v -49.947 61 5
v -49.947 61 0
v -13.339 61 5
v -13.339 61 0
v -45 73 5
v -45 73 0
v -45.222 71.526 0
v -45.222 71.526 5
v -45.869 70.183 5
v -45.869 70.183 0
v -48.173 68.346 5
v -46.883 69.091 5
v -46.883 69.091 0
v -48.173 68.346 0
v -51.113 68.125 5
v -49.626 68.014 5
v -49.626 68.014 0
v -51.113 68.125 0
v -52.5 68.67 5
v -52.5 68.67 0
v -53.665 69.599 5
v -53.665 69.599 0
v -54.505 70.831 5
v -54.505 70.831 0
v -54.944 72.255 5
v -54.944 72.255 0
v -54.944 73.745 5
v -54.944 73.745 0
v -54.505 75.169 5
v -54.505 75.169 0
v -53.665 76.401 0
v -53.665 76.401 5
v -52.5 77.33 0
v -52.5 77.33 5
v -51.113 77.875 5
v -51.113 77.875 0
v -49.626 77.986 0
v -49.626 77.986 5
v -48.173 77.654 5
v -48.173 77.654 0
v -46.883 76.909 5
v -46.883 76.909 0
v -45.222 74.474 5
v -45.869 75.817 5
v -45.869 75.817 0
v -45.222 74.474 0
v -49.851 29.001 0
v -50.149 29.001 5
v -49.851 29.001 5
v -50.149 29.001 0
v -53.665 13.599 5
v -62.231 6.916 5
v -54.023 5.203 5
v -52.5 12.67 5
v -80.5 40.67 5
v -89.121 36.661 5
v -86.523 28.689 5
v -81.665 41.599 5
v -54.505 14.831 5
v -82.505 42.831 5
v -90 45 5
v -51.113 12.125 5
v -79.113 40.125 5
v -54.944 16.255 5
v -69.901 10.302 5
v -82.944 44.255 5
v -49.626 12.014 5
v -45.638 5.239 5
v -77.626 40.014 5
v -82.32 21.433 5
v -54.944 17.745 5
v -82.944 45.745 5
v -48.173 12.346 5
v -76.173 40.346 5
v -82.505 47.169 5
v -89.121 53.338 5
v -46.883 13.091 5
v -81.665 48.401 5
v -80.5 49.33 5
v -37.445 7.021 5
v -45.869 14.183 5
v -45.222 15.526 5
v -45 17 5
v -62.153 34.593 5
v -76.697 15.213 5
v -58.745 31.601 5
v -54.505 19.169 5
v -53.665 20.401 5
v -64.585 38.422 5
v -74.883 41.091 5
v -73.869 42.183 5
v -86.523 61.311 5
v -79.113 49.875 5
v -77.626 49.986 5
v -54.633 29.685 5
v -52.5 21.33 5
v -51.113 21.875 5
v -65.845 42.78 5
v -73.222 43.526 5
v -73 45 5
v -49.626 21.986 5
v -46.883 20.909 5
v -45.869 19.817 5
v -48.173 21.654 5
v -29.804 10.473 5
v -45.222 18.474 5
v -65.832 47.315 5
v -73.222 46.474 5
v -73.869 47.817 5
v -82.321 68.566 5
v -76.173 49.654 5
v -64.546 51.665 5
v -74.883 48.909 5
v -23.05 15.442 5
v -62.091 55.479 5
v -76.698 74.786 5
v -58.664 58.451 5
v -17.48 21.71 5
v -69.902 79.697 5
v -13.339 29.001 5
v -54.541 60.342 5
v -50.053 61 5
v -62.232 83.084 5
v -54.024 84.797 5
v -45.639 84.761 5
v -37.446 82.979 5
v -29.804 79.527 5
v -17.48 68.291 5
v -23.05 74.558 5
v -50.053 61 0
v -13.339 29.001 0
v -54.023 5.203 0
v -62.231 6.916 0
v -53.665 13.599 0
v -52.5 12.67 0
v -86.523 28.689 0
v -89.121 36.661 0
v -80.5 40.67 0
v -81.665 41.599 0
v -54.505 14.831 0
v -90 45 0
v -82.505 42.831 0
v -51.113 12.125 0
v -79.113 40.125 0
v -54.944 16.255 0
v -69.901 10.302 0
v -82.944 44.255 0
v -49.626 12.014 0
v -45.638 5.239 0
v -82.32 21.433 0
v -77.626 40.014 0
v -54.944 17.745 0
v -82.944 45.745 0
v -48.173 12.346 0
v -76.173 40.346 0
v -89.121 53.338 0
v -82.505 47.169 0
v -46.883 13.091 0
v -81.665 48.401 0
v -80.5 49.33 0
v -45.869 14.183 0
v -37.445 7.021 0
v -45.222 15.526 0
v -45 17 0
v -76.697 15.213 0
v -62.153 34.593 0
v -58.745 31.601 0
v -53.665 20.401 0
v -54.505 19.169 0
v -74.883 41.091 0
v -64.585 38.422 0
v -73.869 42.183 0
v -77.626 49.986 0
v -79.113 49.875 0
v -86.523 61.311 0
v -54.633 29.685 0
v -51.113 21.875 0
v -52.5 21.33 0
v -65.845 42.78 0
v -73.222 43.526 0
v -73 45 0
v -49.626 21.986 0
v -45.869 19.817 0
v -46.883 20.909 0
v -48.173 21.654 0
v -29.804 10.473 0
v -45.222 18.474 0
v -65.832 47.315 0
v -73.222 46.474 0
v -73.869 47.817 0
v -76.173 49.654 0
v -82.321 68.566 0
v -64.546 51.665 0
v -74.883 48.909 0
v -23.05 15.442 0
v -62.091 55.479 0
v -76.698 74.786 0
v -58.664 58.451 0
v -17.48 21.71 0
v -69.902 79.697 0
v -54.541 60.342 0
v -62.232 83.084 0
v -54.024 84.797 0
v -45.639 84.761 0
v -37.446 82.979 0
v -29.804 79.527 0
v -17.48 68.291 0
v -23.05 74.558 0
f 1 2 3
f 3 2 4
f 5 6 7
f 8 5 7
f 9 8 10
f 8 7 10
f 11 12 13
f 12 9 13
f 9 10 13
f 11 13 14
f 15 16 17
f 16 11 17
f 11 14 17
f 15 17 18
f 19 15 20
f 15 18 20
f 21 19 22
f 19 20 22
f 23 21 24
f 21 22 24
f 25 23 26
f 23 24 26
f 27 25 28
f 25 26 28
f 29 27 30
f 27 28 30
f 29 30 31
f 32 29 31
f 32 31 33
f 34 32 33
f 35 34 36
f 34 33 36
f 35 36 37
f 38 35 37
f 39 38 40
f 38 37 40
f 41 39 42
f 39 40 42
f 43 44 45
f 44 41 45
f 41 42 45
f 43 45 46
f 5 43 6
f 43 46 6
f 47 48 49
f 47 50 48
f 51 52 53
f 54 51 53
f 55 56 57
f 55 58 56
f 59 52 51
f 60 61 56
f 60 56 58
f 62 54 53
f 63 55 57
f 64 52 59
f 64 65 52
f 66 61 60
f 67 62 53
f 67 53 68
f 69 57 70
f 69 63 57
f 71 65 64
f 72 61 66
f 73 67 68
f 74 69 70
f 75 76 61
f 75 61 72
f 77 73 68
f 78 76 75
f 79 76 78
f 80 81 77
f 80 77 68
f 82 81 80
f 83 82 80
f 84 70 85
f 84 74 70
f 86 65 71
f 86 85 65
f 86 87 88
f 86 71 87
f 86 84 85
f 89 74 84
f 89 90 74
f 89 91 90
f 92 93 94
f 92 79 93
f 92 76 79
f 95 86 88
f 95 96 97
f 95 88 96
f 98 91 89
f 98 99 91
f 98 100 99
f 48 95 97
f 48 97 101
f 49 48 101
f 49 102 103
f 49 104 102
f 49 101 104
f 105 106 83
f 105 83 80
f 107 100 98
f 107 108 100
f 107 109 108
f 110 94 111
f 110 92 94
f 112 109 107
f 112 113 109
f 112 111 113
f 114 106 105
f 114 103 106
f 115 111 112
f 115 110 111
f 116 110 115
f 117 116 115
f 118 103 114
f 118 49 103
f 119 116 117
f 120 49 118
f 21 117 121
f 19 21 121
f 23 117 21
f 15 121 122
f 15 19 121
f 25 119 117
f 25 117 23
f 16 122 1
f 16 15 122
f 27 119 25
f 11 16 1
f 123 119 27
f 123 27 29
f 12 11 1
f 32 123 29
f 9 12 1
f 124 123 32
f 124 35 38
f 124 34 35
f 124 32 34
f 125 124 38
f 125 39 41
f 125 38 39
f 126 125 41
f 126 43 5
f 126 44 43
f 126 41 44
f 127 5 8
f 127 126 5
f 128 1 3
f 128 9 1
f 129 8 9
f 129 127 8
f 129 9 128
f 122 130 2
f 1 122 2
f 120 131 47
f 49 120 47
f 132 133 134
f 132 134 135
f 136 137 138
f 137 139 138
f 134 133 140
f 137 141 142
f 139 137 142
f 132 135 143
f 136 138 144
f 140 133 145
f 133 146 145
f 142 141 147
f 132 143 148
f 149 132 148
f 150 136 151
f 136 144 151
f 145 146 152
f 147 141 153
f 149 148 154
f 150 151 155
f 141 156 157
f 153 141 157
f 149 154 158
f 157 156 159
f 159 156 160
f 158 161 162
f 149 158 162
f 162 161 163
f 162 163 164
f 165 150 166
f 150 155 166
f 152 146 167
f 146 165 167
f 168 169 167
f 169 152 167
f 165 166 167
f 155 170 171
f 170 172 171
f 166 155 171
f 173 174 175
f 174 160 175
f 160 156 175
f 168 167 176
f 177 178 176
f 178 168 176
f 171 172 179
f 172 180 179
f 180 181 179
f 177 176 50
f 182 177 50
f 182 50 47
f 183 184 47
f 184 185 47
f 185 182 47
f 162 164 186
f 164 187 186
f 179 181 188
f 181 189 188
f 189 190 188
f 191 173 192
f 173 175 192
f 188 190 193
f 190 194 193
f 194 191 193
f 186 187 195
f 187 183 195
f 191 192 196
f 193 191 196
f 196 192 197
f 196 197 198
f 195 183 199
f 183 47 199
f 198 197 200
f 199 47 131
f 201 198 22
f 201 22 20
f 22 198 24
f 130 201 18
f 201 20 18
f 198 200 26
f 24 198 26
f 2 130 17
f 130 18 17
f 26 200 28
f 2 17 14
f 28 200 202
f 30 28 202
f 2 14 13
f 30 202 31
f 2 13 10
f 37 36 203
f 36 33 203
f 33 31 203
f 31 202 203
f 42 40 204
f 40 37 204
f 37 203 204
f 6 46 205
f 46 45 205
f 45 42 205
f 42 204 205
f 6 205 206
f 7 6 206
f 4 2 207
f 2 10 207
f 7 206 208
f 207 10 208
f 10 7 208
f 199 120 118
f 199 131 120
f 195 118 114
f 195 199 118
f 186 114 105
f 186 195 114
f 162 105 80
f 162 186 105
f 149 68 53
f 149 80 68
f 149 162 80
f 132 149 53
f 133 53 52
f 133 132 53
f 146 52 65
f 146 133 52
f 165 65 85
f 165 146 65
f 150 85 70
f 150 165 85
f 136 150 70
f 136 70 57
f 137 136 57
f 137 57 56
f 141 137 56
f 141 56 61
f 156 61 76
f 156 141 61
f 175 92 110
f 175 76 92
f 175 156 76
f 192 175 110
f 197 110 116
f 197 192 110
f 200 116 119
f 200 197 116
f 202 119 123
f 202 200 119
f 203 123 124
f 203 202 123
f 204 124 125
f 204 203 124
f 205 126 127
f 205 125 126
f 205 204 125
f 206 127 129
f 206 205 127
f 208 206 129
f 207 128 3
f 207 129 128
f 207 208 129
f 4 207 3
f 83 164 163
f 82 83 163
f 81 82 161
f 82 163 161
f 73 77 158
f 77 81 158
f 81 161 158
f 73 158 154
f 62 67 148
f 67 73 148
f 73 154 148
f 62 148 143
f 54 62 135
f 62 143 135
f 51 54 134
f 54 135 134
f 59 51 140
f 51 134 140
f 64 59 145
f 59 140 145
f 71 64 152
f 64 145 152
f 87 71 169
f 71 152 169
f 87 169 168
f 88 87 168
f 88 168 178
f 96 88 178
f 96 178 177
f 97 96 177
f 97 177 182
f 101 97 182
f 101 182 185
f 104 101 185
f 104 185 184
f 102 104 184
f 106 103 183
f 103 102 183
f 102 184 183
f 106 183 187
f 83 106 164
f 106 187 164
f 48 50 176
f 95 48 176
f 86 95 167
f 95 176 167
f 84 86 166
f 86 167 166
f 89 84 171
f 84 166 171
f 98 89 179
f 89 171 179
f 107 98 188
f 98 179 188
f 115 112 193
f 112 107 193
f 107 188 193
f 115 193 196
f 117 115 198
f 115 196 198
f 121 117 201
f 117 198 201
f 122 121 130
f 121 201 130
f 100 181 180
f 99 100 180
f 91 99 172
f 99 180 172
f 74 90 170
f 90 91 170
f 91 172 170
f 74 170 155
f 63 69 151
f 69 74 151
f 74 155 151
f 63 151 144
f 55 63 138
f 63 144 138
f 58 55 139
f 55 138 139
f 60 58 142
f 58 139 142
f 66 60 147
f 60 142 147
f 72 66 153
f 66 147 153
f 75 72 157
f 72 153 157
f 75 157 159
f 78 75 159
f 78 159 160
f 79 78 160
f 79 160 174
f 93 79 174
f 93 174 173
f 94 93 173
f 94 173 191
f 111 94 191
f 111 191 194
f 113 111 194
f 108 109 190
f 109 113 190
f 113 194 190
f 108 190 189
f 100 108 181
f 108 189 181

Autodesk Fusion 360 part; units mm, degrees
sketch "Sketch1" plane through (0, 0, 0) normal (0, 0, 1) x (1, 0, 0)
  circle A0 centre (-50, 73) radius 5
  circle A1 centre (-50, 17) radius 5
  circle A2 centre (-78, 45) radius 5
  line L0 (-50.0531, 60.9999) -> (-49.9469, 60.9999)
  line L1 (-50.1491, 29.0007) -> (-49.8509, 29.0007)
  arc A3 (-49.9469, 60.9999) -> (-49.8509, 29.0007) centre (-50, 45) ccw
  line L2 (-50.0531, 60.9999) -> (-13.3394, 60.9999)
  line L3 (-13.3391, 29.0007) -> (-50.1491, 29.0007)
  arc A4 (-13.3394, 60.9999) -> (-13.3391, 29.0007) centre (-50, 45) ccw
  dimension "d1" = 80
  dimension "d3" = 10
  dimension "d5" = 10
  dimension "d7" = 10
extrude "Extrude1" add sketch "Sketch1" along normal blind 5
